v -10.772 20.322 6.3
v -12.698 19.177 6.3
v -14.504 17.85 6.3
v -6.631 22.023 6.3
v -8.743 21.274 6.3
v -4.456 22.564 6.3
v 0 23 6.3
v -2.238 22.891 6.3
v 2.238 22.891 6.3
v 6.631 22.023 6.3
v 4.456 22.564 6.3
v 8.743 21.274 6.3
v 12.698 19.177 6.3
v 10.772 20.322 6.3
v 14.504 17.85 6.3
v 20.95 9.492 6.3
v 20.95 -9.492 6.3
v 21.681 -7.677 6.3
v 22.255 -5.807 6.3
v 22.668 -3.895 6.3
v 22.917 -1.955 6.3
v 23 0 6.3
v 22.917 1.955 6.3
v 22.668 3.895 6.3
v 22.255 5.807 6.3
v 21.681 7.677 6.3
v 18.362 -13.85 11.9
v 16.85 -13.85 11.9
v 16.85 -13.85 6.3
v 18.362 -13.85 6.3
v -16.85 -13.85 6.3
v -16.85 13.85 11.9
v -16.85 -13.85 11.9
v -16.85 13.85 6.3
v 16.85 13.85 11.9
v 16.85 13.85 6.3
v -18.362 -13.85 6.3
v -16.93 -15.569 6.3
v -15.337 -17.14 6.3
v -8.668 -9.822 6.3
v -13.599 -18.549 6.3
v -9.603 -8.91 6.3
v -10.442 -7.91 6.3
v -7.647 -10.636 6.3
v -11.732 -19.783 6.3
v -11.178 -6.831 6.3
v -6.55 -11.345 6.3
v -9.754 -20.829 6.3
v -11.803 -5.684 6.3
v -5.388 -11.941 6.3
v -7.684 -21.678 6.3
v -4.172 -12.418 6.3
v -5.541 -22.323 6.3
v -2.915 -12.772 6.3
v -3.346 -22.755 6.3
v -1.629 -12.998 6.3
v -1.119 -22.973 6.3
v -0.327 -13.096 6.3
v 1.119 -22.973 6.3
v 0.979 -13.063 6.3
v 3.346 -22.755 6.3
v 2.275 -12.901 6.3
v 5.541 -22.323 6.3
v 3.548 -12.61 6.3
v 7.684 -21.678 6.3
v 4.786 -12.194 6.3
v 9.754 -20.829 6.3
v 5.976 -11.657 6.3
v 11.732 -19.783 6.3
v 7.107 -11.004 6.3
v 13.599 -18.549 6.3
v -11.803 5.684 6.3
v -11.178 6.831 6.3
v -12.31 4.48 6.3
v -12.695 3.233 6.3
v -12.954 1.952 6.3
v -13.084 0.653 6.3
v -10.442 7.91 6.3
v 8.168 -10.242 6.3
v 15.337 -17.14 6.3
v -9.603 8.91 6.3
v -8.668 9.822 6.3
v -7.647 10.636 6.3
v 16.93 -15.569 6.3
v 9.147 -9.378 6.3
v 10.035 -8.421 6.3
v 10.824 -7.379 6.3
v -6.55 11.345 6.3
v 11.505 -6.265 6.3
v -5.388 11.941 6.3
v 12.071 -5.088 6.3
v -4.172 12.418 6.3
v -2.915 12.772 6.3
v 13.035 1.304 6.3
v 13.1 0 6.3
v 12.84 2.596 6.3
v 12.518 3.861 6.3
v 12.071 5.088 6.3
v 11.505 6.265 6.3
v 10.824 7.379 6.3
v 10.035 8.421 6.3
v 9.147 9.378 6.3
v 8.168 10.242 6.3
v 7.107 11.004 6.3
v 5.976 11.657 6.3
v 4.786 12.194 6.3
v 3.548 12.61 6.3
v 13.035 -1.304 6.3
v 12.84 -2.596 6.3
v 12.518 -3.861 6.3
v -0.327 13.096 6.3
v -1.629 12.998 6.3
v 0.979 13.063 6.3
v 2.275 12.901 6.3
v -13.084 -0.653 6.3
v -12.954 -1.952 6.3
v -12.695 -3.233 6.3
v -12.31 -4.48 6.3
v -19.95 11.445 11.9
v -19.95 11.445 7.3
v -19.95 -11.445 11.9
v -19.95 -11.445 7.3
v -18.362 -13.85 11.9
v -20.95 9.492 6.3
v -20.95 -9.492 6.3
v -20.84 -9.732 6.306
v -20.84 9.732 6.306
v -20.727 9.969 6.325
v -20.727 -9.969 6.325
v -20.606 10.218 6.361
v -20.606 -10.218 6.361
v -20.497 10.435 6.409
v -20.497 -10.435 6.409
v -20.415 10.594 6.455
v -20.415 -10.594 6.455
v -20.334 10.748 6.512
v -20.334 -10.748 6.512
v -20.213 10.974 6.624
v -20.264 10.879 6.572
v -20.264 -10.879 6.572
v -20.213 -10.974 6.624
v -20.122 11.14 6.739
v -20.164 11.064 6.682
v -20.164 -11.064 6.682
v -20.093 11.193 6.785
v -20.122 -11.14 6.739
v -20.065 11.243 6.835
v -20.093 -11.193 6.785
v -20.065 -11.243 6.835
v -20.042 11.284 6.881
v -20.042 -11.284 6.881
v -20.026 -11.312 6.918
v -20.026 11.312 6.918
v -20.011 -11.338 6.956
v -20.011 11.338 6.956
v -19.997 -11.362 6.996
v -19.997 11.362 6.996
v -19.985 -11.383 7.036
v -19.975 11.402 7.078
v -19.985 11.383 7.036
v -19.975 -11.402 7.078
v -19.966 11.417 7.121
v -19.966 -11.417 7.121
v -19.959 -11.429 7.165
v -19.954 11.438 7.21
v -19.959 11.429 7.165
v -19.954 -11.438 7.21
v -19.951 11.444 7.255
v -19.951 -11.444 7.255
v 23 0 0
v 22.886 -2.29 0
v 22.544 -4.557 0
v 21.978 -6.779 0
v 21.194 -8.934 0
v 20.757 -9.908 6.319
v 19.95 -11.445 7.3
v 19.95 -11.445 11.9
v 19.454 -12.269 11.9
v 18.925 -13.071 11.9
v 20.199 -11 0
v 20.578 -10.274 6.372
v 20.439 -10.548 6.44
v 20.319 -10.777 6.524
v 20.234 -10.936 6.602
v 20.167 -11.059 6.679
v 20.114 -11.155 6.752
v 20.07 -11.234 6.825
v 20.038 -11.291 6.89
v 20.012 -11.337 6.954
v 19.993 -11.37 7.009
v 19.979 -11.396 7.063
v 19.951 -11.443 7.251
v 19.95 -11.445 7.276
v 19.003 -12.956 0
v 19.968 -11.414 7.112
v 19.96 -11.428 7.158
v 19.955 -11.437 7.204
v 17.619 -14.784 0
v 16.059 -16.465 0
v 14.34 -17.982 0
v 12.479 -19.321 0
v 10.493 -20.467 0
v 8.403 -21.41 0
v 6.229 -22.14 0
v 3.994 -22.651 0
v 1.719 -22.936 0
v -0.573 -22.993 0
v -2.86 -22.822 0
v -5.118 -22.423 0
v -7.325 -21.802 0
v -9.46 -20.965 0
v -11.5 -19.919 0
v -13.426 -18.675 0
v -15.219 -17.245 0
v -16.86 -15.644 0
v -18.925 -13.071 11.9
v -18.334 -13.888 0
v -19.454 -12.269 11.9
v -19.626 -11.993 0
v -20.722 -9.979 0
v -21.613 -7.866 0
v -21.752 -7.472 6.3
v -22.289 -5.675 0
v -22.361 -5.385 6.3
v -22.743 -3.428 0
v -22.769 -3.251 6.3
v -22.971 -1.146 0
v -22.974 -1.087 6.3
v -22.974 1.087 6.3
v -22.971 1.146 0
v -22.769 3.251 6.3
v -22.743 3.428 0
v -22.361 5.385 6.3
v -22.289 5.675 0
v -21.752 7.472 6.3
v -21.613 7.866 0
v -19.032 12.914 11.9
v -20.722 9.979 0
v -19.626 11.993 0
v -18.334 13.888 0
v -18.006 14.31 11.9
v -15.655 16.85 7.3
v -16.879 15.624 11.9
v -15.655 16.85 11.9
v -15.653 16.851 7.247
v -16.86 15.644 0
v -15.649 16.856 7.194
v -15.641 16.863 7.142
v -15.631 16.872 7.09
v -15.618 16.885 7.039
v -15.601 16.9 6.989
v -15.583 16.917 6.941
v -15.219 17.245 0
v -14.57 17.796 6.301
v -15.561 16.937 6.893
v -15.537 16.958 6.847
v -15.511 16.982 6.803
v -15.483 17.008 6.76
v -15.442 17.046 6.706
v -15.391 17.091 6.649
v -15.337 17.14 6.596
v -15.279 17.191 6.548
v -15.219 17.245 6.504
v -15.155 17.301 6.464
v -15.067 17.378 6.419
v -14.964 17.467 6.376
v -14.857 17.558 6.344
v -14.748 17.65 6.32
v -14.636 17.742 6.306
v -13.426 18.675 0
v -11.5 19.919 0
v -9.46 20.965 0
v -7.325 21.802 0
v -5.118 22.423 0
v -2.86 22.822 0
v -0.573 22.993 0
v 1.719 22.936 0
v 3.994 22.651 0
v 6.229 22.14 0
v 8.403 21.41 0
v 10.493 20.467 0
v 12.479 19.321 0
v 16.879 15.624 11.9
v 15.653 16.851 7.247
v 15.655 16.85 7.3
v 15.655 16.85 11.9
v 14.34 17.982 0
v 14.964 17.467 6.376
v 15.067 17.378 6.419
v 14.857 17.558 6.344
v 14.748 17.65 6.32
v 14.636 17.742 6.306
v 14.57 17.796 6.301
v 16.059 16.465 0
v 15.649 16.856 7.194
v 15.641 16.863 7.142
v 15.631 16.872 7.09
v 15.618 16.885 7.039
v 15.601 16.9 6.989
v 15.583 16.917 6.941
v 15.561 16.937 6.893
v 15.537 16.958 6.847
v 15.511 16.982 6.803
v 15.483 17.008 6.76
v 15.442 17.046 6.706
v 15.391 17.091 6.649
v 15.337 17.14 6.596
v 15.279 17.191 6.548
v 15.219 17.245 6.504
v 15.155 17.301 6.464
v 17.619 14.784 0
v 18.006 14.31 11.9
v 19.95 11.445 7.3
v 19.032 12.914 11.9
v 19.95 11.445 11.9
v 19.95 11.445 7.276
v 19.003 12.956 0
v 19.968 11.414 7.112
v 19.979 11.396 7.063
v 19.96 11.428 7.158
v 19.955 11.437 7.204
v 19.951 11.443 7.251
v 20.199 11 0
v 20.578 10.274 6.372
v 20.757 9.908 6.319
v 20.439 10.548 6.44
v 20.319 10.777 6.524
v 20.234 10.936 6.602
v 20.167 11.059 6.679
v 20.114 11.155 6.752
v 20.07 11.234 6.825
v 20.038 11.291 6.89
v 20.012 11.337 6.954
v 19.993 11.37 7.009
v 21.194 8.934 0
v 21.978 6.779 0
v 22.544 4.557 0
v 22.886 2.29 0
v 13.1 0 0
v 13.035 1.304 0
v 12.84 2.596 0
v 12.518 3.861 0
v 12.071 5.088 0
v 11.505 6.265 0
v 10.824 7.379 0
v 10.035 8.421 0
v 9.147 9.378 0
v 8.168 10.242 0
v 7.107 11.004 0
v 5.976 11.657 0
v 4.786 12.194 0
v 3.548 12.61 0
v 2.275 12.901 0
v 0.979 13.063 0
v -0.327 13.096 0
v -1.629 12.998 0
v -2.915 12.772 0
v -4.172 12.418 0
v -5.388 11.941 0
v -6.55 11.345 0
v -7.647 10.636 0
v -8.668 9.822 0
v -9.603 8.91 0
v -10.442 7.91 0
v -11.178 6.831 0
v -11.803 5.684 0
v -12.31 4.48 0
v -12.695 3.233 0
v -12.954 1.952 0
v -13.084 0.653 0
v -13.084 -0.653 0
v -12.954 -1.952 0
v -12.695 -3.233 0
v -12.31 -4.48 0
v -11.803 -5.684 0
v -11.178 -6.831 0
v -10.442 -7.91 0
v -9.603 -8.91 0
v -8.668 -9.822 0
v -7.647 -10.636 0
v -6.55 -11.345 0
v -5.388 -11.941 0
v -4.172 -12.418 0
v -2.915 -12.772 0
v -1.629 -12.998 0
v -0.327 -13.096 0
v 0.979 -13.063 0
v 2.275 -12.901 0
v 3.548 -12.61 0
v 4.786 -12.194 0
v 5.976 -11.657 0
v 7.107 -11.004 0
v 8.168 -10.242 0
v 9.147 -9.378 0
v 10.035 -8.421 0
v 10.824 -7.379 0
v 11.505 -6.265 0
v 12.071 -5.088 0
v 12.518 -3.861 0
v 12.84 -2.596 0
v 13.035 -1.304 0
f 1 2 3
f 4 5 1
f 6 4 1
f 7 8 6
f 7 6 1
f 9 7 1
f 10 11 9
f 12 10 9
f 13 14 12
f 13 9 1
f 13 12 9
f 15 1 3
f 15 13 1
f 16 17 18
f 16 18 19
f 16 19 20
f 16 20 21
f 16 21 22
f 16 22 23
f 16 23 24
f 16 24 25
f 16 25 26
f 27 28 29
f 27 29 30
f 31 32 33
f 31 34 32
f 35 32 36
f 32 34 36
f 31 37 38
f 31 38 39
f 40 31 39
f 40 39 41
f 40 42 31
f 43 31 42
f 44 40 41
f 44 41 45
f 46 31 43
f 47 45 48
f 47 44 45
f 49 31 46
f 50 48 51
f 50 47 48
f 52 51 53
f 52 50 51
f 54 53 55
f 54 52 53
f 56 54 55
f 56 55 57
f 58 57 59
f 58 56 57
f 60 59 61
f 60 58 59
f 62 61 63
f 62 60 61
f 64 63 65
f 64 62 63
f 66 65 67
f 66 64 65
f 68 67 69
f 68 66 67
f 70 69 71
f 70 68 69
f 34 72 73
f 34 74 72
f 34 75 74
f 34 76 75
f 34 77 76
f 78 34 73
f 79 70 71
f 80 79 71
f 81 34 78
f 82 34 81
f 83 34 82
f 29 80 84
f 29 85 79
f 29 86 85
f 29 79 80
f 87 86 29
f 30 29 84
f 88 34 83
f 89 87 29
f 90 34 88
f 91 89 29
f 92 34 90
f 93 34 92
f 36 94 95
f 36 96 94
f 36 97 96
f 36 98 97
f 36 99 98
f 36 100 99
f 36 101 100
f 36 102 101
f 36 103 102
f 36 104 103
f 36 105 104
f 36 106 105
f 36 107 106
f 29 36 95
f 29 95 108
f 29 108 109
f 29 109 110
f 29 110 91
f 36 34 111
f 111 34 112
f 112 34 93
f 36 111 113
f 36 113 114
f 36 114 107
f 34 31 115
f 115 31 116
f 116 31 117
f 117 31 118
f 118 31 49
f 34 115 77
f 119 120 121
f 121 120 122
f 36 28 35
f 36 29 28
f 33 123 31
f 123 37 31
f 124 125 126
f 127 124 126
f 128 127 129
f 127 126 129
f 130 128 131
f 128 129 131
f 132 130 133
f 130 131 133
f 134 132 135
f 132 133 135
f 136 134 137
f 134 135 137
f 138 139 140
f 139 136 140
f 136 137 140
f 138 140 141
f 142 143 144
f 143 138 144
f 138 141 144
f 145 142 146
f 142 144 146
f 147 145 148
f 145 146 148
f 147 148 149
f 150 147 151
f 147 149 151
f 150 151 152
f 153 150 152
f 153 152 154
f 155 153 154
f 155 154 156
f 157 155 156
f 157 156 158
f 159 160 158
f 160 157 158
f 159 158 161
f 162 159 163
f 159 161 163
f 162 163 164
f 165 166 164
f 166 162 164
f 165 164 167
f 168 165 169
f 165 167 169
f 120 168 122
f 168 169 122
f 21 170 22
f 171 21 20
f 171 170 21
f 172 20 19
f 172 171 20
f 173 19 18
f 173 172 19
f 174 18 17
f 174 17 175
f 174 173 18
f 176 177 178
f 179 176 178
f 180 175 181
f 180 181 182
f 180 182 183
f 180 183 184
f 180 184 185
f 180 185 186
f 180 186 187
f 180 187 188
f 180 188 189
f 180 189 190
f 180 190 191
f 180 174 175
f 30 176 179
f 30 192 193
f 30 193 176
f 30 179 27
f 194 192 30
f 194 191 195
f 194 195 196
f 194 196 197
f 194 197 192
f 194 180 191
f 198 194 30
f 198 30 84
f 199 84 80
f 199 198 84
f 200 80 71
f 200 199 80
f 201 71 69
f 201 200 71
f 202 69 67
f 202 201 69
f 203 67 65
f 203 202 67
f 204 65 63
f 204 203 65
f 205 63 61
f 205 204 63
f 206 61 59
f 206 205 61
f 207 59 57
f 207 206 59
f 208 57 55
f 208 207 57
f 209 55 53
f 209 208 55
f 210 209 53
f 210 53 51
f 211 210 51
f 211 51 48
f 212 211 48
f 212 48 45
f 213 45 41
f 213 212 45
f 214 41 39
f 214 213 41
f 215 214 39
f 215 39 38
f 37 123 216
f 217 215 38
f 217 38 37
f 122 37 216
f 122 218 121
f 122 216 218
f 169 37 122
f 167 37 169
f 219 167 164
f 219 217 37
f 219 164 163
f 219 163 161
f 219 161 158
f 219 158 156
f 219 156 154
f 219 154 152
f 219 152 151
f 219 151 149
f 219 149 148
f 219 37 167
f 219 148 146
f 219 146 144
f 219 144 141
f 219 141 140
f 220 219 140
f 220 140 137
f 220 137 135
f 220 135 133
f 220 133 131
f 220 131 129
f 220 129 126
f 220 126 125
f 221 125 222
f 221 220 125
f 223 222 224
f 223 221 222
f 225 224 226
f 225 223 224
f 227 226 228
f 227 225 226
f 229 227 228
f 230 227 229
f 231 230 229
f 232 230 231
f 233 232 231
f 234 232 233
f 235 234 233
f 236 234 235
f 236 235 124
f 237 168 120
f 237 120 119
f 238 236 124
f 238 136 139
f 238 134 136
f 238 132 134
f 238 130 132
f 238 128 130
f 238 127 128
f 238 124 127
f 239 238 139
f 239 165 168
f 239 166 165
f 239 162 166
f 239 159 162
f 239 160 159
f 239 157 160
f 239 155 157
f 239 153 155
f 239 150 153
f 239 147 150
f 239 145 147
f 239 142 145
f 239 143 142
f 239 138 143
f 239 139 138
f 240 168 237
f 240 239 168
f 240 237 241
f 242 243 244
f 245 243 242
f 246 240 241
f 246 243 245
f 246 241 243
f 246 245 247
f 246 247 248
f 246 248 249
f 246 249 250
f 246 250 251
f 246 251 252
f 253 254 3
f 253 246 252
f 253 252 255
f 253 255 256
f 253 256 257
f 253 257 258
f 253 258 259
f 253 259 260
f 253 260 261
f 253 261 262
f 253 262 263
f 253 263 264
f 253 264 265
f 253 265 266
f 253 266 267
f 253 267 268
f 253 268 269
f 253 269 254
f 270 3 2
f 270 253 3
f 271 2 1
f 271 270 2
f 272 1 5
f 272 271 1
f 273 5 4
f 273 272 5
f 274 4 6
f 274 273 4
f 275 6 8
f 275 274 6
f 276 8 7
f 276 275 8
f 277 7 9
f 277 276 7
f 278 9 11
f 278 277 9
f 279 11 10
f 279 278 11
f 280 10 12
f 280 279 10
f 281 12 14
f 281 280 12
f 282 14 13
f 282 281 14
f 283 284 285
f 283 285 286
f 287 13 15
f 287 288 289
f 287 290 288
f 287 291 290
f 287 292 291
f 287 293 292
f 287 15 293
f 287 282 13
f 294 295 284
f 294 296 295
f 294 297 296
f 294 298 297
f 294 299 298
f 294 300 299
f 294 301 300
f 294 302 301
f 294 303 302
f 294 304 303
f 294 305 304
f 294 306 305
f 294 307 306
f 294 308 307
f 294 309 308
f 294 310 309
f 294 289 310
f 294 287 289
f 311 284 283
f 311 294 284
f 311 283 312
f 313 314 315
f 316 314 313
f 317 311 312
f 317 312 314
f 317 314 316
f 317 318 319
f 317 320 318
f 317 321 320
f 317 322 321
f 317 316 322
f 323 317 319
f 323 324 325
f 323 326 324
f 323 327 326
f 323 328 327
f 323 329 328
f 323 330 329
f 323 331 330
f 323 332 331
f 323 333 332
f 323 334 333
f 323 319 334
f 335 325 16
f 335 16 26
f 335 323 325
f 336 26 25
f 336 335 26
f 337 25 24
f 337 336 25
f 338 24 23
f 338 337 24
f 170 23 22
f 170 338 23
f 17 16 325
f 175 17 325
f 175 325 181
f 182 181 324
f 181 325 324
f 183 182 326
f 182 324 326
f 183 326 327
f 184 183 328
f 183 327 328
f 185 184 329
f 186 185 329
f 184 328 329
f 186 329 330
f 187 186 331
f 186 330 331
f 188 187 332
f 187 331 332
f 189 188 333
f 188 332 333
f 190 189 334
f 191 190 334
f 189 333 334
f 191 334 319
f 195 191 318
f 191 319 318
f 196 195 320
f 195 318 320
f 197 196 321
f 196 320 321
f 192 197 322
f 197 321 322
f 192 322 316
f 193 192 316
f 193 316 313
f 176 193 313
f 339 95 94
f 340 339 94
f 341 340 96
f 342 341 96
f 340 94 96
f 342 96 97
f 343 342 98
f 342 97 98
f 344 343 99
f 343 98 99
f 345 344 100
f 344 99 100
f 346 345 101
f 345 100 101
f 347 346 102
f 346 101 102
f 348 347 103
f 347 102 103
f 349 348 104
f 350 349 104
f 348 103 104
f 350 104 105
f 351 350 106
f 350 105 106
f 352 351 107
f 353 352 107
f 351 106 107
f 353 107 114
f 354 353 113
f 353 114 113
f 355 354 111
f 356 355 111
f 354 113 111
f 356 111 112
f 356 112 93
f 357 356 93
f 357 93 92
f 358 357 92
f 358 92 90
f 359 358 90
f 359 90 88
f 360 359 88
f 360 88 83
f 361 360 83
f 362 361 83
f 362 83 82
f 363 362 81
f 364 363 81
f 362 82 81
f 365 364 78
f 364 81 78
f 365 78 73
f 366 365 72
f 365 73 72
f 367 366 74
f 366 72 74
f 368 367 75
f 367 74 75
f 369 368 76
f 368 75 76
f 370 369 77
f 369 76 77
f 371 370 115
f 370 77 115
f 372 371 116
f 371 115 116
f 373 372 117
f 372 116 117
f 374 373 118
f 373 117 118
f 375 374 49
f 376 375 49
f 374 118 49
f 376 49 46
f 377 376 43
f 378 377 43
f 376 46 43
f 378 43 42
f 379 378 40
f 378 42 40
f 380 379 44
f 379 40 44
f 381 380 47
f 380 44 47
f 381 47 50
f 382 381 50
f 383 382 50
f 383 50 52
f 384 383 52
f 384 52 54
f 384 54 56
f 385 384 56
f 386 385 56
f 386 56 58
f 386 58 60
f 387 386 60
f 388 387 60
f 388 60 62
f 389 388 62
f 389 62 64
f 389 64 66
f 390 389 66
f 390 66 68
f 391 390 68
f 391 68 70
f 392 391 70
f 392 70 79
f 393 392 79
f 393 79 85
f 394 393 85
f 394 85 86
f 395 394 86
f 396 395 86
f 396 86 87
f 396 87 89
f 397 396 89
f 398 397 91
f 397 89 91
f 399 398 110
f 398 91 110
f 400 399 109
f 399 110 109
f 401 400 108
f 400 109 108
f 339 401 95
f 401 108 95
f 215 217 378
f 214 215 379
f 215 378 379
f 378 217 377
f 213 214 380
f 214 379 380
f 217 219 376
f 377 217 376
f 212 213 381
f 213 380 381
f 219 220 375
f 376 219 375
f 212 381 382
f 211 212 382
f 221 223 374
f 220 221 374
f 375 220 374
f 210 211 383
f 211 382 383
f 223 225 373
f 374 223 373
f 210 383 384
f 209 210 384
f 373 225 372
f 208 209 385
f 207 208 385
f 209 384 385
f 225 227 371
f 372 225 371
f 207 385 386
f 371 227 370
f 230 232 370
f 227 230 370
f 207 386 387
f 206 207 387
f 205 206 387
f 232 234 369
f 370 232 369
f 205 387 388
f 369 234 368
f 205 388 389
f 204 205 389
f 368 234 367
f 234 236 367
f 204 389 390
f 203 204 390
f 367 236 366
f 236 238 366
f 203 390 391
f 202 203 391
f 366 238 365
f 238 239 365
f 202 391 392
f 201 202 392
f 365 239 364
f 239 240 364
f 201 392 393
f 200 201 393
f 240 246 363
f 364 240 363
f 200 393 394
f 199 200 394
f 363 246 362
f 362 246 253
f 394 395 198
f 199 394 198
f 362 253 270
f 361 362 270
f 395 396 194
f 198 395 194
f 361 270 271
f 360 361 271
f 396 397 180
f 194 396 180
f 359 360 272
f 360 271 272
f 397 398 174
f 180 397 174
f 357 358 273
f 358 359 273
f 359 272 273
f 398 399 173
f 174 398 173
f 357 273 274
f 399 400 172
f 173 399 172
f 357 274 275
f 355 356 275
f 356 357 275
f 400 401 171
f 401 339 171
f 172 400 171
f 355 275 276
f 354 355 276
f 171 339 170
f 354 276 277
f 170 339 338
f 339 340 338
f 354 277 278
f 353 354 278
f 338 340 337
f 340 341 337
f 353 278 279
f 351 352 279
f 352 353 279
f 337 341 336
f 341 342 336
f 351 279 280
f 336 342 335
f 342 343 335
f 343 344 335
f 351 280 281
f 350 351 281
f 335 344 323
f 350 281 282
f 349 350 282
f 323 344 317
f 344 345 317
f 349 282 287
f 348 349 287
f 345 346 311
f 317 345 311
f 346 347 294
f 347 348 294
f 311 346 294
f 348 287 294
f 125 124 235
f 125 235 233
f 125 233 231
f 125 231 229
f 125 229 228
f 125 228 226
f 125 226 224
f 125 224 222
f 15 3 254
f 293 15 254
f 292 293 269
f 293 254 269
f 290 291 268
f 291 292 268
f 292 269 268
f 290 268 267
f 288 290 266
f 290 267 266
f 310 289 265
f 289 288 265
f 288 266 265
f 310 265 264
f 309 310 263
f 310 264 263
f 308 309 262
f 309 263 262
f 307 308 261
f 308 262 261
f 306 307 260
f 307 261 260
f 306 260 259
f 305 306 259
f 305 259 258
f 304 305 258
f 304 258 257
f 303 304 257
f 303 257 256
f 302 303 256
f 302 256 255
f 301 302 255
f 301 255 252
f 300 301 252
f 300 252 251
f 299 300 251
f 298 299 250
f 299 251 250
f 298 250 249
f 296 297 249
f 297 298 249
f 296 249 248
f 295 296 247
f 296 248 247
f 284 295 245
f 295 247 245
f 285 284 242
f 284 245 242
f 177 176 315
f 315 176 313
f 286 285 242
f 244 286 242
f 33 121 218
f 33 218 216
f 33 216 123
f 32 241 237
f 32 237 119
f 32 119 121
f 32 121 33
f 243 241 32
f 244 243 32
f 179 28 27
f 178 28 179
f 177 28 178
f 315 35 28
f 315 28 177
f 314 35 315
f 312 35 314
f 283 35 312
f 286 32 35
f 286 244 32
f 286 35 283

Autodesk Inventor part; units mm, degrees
ref_plane "YZ Plane" through (0, 0, 0) normal (1, 0, 0) x (0, 1, 0)
ref_plane "XZ Plane" through (0, 0, 0) normal (0, 1, 0) x (-1, 0, 0)
ref_plane "XY Plane" through (0, 0, 0) normal (0, 0, 1) x (1, 0, 0)
sketch "スケッチ1" plane through (0, 0, 0) normal (0, 0, 1) x (1, 0, 0)
  circle A0 centre (0, 0) radius 23
  dimension "d0" = 46
extrude "押し出し1" add sketch "スケッチ1" along normal blind 6.3
sketch "スケッチ2" plane through (0, 0, 6.3) normal (0, 0, 1) x (1, 0, 0)
  line L0 (0, 0) -> (16.85, 0)
  line L1 (16.85, 0) -> (16.85, 13.85)
  line L2 (16.85, 13.85) -> (0, 13.85)
  line L3 (0, 13.85) -> (0, 0)
  line L4 (0, 0) -> (-16.85, 0)
  line L5 (-16.85, 0) -> (-16.85, 13.85)
  line L6 (-16.85, 13.85) -> (0, 13.85)
  line L7 (-19.95, -13.85) -> (19.95, -13.85)
  line L8 (19.95, -13.85) -> (19.95, 16.85)
  line L9 (19.95, 16.85) -> (-19.95, 16.85)
  line L10 (-19.95, 16.85) -> (-19.95, -13.85)
  line L11 (-16.85, 0) -> (-16.85, -13.85)
  line L12 (16.85, 0) -> (16.85, -13.85)
  circle A0 centre (0, 0) radius 23
  point P0 (18.3624, -13.85)
  point P1 (19.95, -11.4454)
  point P2 (19.95, 11.4454)
  point P3 (15.655, 16.85)
  point P4 (-15.655, 16.85)
  point P5 (-19.95, 11.4454)
  point P6 (-19.95, -11.4454)
  point P7 (-18.3624, -13.85)
  dimension "d3" = 13.85
  dimension "d4" = 16.85
  dimension "d5" = 3
  dimension "d6" = 3.1
  dimension "d8" = 3.1
  dimension "d9" = 30.7
  dimension "d10" = 46
extrude "押し出し2" add sketch "スケッチ2" along normal blind 5.6 contours L1 L2 L6 L5 L11 L7 A0 L10 L9 L8 L12
sketch "スケッチ3" plane through (0, 0, 6.3) normal (0, 0, 1) x (1, 0, 0)
  circle A0 centre (0, 0) radius 13.1
  dimension "d13" = 26.2
extrude "押し出し3" cut sketch "スケッチ3" against normal blind 7
sketch "スケッチ4" plane through (0, 0, 0) normal (0, 0, -1) x (-1, 0, 0)
  circle A0 centre (0, 0) radius 19.5
  dimension "d16" = 39
extrude "押し出し4" [suppressed]
fillet "フィレット1" radius 1 3 edges at (0, 16.85, 6.3) (19.95, 0, 6.3) (-19.95, 0, 6.3)
properties part number "connectpart2"
